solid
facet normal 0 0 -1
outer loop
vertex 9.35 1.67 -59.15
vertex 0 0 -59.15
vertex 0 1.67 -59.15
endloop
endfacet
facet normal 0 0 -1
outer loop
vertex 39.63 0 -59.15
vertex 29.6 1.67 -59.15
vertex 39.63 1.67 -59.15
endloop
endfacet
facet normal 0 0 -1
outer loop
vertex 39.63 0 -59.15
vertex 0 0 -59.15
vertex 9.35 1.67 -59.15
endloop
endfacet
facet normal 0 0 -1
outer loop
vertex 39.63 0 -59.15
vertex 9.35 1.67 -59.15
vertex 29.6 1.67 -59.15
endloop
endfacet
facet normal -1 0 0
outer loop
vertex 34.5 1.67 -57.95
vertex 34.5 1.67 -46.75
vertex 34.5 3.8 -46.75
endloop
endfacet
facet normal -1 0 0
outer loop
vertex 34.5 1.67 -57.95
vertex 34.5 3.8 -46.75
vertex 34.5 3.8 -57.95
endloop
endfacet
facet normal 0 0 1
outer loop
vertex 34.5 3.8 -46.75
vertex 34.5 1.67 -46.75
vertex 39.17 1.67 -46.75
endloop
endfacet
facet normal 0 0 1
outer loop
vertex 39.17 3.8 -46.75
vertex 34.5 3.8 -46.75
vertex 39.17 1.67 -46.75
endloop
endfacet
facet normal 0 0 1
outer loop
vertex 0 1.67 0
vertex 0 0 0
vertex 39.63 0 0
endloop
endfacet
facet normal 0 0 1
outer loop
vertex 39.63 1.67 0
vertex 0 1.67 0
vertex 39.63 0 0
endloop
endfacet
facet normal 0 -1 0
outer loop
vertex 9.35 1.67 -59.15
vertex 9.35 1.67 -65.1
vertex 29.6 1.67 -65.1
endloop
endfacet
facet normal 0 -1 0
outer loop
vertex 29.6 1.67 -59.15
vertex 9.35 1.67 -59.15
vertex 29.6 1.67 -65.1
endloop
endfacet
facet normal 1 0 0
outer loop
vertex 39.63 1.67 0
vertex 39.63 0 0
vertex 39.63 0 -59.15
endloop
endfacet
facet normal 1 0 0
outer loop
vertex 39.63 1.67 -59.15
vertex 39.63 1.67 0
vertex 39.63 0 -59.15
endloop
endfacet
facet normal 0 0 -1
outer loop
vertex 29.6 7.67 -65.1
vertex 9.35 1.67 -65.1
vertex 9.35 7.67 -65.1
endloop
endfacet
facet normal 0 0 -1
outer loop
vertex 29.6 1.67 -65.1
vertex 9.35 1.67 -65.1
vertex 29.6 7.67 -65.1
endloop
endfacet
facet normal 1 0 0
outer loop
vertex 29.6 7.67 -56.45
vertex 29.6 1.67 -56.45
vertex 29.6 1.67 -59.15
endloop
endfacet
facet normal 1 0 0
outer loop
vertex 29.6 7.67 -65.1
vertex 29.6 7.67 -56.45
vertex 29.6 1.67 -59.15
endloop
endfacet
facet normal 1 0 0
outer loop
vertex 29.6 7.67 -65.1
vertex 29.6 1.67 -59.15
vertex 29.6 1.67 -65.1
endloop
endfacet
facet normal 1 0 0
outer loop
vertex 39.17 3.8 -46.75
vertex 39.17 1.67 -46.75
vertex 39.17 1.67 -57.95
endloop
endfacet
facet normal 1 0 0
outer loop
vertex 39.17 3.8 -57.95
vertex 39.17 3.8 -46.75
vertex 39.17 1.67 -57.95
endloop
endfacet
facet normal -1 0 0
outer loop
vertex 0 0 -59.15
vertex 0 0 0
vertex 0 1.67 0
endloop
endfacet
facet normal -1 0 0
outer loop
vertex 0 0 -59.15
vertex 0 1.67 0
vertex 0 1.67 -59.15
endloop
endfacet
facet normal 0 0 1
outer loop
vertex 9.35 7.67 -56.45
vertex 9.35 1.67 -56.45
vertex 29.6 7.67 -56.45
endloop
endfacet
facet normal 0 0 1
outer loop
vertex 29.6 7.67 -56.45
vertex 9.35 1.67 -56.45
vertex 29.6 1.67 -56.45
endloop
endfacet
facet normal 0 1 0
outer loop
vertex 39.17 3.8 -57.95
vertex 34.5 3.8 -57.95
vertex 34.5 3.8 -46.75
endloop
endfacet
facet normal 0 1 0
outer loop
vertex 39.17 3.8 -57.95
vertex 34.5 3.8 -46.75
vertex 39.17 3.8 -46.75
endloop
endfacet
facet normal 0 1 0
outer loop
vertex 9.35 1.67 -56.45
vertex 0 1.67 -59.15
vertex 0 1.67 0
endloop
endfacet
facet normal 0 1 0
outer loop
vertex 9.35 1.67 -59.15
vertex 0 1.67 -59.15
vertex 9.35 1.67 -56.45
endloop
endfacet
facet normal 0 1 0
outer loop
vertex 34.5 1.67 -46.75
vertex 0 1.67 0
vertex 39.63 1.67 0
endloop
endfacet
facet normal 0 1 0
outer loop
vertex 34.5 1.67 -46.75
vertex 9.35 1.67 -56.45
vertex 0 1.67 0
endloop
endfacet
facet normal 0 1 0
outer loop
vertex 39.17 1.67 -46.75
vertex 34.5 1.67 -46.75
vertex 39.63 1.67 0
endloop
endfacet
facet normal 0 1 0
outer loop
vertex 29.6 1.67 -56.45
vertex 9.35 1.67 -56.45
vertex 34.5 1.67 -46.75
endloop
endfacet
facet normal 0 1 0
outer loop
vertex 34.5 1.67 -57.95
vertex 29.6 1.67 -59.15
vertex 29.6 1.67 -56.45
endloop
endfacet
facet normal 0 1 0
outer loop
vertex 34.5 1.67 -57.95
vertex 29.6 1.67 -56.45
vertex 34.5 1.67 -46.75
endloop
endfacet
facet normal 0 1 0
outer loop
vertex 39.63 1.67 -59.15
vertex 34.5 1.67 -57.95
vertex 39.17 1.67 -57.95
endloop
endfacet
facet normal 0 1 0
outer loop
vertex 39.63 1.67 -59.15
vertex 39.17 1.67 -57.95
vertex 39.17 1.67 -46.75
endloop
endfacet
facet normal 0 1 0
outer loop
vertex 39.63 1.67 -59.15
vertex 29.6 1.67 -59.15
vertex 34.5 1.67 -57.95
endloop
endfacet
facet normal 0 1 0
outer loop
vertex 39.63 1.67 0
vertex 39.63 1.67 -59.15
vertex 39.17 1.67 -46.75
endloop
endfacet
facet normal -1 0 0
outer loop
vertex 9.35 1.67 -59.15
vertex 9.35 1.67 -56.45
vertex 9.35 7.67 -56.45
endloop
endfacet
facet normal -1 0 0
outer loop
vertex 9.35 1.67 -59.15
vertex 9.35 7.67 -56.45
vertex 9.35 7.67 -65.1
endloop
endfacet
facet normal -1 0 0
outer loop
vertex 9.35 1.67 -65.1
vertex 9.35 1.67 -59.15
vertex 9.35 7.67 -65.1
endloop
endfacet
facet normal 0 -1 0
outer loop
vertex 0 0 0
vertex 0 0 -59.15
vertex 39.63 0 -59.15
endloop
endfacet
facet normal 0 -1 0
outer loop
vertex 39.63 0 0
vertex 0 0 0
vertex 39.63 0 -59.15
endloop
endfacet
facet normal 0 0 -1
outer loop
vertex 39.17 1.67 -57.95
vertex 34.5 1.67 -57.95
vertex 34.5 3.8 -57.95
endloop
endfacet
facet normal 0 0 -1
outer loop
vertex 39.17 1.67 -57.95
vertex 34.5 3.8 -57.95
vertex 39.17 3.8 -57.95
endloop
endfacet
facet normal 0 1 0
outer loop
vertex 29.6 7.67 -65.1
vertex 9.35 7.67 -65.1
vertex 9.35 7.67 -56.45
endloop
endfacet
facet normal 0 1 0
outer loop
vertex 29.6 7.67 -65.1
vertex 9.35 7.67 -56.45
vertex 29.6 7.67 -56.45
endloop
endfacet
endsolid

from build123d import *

# Parameters (mm, degrees)
SKETCH1_W           = 39.63
SKETCH1_H           = 59.15
BOSS_EXTRUDE1_DEPTH = 1.67
BOSS_EXTRUDE2_START = 1.67
SKETCH2_W           = 20.25
SKETCH2_H           = 8.65
BOSS_EXTRUDE2_DEPTH = 6
SKETCH3_W           = 4.67
SKETCH3_H           = 11.2
BOSS_EXTRUDE3_DEPTH = 3.8


with BuildPart() as part:
    # Sketch1 → Boss-Extrude1 (new body)
    with BuildSketch(Plane(origin=(0, 0, 0), x_dir=(1, 0, 0), z_dir=(0, 1, 0))):
        with Locations((19.815, 29.575)):
            Rectangle(SKETCH1_W, SKETCH1_H)
    extrude(amount=BOSS_EXTRUDE1_DEPTH)

    # Sketch2 → Boss-Extrude2 (add)
    with BuildSketch(Plane(origin=(0, 0, 0), x_dir=(1, 0, 0), z_dir=(0, 1, 0)).offset(BOSS_EXTRUDE2_START)):
        with Locations((19.475, 60.775)):
            Rectangle(SKETCH2_W, SKETCH2_H)
    extrude(amount=BOSS_EXTRUDE2_DEPTH)

    # Sketch3 → Boss-Extrude3 (add)
    with BuildSketch(Plane(origin=(0, 0, 0), x_dir=(1, 0, 0), z_dir=(0, 1, 0))):
        with Locations((36.835, 52.35)):
            Rectangle(SKETCH3_W, SKETCH3_H)
    extrude(amount=BOSS_EXTRUDE3_DEPTH)


solid = part.part
